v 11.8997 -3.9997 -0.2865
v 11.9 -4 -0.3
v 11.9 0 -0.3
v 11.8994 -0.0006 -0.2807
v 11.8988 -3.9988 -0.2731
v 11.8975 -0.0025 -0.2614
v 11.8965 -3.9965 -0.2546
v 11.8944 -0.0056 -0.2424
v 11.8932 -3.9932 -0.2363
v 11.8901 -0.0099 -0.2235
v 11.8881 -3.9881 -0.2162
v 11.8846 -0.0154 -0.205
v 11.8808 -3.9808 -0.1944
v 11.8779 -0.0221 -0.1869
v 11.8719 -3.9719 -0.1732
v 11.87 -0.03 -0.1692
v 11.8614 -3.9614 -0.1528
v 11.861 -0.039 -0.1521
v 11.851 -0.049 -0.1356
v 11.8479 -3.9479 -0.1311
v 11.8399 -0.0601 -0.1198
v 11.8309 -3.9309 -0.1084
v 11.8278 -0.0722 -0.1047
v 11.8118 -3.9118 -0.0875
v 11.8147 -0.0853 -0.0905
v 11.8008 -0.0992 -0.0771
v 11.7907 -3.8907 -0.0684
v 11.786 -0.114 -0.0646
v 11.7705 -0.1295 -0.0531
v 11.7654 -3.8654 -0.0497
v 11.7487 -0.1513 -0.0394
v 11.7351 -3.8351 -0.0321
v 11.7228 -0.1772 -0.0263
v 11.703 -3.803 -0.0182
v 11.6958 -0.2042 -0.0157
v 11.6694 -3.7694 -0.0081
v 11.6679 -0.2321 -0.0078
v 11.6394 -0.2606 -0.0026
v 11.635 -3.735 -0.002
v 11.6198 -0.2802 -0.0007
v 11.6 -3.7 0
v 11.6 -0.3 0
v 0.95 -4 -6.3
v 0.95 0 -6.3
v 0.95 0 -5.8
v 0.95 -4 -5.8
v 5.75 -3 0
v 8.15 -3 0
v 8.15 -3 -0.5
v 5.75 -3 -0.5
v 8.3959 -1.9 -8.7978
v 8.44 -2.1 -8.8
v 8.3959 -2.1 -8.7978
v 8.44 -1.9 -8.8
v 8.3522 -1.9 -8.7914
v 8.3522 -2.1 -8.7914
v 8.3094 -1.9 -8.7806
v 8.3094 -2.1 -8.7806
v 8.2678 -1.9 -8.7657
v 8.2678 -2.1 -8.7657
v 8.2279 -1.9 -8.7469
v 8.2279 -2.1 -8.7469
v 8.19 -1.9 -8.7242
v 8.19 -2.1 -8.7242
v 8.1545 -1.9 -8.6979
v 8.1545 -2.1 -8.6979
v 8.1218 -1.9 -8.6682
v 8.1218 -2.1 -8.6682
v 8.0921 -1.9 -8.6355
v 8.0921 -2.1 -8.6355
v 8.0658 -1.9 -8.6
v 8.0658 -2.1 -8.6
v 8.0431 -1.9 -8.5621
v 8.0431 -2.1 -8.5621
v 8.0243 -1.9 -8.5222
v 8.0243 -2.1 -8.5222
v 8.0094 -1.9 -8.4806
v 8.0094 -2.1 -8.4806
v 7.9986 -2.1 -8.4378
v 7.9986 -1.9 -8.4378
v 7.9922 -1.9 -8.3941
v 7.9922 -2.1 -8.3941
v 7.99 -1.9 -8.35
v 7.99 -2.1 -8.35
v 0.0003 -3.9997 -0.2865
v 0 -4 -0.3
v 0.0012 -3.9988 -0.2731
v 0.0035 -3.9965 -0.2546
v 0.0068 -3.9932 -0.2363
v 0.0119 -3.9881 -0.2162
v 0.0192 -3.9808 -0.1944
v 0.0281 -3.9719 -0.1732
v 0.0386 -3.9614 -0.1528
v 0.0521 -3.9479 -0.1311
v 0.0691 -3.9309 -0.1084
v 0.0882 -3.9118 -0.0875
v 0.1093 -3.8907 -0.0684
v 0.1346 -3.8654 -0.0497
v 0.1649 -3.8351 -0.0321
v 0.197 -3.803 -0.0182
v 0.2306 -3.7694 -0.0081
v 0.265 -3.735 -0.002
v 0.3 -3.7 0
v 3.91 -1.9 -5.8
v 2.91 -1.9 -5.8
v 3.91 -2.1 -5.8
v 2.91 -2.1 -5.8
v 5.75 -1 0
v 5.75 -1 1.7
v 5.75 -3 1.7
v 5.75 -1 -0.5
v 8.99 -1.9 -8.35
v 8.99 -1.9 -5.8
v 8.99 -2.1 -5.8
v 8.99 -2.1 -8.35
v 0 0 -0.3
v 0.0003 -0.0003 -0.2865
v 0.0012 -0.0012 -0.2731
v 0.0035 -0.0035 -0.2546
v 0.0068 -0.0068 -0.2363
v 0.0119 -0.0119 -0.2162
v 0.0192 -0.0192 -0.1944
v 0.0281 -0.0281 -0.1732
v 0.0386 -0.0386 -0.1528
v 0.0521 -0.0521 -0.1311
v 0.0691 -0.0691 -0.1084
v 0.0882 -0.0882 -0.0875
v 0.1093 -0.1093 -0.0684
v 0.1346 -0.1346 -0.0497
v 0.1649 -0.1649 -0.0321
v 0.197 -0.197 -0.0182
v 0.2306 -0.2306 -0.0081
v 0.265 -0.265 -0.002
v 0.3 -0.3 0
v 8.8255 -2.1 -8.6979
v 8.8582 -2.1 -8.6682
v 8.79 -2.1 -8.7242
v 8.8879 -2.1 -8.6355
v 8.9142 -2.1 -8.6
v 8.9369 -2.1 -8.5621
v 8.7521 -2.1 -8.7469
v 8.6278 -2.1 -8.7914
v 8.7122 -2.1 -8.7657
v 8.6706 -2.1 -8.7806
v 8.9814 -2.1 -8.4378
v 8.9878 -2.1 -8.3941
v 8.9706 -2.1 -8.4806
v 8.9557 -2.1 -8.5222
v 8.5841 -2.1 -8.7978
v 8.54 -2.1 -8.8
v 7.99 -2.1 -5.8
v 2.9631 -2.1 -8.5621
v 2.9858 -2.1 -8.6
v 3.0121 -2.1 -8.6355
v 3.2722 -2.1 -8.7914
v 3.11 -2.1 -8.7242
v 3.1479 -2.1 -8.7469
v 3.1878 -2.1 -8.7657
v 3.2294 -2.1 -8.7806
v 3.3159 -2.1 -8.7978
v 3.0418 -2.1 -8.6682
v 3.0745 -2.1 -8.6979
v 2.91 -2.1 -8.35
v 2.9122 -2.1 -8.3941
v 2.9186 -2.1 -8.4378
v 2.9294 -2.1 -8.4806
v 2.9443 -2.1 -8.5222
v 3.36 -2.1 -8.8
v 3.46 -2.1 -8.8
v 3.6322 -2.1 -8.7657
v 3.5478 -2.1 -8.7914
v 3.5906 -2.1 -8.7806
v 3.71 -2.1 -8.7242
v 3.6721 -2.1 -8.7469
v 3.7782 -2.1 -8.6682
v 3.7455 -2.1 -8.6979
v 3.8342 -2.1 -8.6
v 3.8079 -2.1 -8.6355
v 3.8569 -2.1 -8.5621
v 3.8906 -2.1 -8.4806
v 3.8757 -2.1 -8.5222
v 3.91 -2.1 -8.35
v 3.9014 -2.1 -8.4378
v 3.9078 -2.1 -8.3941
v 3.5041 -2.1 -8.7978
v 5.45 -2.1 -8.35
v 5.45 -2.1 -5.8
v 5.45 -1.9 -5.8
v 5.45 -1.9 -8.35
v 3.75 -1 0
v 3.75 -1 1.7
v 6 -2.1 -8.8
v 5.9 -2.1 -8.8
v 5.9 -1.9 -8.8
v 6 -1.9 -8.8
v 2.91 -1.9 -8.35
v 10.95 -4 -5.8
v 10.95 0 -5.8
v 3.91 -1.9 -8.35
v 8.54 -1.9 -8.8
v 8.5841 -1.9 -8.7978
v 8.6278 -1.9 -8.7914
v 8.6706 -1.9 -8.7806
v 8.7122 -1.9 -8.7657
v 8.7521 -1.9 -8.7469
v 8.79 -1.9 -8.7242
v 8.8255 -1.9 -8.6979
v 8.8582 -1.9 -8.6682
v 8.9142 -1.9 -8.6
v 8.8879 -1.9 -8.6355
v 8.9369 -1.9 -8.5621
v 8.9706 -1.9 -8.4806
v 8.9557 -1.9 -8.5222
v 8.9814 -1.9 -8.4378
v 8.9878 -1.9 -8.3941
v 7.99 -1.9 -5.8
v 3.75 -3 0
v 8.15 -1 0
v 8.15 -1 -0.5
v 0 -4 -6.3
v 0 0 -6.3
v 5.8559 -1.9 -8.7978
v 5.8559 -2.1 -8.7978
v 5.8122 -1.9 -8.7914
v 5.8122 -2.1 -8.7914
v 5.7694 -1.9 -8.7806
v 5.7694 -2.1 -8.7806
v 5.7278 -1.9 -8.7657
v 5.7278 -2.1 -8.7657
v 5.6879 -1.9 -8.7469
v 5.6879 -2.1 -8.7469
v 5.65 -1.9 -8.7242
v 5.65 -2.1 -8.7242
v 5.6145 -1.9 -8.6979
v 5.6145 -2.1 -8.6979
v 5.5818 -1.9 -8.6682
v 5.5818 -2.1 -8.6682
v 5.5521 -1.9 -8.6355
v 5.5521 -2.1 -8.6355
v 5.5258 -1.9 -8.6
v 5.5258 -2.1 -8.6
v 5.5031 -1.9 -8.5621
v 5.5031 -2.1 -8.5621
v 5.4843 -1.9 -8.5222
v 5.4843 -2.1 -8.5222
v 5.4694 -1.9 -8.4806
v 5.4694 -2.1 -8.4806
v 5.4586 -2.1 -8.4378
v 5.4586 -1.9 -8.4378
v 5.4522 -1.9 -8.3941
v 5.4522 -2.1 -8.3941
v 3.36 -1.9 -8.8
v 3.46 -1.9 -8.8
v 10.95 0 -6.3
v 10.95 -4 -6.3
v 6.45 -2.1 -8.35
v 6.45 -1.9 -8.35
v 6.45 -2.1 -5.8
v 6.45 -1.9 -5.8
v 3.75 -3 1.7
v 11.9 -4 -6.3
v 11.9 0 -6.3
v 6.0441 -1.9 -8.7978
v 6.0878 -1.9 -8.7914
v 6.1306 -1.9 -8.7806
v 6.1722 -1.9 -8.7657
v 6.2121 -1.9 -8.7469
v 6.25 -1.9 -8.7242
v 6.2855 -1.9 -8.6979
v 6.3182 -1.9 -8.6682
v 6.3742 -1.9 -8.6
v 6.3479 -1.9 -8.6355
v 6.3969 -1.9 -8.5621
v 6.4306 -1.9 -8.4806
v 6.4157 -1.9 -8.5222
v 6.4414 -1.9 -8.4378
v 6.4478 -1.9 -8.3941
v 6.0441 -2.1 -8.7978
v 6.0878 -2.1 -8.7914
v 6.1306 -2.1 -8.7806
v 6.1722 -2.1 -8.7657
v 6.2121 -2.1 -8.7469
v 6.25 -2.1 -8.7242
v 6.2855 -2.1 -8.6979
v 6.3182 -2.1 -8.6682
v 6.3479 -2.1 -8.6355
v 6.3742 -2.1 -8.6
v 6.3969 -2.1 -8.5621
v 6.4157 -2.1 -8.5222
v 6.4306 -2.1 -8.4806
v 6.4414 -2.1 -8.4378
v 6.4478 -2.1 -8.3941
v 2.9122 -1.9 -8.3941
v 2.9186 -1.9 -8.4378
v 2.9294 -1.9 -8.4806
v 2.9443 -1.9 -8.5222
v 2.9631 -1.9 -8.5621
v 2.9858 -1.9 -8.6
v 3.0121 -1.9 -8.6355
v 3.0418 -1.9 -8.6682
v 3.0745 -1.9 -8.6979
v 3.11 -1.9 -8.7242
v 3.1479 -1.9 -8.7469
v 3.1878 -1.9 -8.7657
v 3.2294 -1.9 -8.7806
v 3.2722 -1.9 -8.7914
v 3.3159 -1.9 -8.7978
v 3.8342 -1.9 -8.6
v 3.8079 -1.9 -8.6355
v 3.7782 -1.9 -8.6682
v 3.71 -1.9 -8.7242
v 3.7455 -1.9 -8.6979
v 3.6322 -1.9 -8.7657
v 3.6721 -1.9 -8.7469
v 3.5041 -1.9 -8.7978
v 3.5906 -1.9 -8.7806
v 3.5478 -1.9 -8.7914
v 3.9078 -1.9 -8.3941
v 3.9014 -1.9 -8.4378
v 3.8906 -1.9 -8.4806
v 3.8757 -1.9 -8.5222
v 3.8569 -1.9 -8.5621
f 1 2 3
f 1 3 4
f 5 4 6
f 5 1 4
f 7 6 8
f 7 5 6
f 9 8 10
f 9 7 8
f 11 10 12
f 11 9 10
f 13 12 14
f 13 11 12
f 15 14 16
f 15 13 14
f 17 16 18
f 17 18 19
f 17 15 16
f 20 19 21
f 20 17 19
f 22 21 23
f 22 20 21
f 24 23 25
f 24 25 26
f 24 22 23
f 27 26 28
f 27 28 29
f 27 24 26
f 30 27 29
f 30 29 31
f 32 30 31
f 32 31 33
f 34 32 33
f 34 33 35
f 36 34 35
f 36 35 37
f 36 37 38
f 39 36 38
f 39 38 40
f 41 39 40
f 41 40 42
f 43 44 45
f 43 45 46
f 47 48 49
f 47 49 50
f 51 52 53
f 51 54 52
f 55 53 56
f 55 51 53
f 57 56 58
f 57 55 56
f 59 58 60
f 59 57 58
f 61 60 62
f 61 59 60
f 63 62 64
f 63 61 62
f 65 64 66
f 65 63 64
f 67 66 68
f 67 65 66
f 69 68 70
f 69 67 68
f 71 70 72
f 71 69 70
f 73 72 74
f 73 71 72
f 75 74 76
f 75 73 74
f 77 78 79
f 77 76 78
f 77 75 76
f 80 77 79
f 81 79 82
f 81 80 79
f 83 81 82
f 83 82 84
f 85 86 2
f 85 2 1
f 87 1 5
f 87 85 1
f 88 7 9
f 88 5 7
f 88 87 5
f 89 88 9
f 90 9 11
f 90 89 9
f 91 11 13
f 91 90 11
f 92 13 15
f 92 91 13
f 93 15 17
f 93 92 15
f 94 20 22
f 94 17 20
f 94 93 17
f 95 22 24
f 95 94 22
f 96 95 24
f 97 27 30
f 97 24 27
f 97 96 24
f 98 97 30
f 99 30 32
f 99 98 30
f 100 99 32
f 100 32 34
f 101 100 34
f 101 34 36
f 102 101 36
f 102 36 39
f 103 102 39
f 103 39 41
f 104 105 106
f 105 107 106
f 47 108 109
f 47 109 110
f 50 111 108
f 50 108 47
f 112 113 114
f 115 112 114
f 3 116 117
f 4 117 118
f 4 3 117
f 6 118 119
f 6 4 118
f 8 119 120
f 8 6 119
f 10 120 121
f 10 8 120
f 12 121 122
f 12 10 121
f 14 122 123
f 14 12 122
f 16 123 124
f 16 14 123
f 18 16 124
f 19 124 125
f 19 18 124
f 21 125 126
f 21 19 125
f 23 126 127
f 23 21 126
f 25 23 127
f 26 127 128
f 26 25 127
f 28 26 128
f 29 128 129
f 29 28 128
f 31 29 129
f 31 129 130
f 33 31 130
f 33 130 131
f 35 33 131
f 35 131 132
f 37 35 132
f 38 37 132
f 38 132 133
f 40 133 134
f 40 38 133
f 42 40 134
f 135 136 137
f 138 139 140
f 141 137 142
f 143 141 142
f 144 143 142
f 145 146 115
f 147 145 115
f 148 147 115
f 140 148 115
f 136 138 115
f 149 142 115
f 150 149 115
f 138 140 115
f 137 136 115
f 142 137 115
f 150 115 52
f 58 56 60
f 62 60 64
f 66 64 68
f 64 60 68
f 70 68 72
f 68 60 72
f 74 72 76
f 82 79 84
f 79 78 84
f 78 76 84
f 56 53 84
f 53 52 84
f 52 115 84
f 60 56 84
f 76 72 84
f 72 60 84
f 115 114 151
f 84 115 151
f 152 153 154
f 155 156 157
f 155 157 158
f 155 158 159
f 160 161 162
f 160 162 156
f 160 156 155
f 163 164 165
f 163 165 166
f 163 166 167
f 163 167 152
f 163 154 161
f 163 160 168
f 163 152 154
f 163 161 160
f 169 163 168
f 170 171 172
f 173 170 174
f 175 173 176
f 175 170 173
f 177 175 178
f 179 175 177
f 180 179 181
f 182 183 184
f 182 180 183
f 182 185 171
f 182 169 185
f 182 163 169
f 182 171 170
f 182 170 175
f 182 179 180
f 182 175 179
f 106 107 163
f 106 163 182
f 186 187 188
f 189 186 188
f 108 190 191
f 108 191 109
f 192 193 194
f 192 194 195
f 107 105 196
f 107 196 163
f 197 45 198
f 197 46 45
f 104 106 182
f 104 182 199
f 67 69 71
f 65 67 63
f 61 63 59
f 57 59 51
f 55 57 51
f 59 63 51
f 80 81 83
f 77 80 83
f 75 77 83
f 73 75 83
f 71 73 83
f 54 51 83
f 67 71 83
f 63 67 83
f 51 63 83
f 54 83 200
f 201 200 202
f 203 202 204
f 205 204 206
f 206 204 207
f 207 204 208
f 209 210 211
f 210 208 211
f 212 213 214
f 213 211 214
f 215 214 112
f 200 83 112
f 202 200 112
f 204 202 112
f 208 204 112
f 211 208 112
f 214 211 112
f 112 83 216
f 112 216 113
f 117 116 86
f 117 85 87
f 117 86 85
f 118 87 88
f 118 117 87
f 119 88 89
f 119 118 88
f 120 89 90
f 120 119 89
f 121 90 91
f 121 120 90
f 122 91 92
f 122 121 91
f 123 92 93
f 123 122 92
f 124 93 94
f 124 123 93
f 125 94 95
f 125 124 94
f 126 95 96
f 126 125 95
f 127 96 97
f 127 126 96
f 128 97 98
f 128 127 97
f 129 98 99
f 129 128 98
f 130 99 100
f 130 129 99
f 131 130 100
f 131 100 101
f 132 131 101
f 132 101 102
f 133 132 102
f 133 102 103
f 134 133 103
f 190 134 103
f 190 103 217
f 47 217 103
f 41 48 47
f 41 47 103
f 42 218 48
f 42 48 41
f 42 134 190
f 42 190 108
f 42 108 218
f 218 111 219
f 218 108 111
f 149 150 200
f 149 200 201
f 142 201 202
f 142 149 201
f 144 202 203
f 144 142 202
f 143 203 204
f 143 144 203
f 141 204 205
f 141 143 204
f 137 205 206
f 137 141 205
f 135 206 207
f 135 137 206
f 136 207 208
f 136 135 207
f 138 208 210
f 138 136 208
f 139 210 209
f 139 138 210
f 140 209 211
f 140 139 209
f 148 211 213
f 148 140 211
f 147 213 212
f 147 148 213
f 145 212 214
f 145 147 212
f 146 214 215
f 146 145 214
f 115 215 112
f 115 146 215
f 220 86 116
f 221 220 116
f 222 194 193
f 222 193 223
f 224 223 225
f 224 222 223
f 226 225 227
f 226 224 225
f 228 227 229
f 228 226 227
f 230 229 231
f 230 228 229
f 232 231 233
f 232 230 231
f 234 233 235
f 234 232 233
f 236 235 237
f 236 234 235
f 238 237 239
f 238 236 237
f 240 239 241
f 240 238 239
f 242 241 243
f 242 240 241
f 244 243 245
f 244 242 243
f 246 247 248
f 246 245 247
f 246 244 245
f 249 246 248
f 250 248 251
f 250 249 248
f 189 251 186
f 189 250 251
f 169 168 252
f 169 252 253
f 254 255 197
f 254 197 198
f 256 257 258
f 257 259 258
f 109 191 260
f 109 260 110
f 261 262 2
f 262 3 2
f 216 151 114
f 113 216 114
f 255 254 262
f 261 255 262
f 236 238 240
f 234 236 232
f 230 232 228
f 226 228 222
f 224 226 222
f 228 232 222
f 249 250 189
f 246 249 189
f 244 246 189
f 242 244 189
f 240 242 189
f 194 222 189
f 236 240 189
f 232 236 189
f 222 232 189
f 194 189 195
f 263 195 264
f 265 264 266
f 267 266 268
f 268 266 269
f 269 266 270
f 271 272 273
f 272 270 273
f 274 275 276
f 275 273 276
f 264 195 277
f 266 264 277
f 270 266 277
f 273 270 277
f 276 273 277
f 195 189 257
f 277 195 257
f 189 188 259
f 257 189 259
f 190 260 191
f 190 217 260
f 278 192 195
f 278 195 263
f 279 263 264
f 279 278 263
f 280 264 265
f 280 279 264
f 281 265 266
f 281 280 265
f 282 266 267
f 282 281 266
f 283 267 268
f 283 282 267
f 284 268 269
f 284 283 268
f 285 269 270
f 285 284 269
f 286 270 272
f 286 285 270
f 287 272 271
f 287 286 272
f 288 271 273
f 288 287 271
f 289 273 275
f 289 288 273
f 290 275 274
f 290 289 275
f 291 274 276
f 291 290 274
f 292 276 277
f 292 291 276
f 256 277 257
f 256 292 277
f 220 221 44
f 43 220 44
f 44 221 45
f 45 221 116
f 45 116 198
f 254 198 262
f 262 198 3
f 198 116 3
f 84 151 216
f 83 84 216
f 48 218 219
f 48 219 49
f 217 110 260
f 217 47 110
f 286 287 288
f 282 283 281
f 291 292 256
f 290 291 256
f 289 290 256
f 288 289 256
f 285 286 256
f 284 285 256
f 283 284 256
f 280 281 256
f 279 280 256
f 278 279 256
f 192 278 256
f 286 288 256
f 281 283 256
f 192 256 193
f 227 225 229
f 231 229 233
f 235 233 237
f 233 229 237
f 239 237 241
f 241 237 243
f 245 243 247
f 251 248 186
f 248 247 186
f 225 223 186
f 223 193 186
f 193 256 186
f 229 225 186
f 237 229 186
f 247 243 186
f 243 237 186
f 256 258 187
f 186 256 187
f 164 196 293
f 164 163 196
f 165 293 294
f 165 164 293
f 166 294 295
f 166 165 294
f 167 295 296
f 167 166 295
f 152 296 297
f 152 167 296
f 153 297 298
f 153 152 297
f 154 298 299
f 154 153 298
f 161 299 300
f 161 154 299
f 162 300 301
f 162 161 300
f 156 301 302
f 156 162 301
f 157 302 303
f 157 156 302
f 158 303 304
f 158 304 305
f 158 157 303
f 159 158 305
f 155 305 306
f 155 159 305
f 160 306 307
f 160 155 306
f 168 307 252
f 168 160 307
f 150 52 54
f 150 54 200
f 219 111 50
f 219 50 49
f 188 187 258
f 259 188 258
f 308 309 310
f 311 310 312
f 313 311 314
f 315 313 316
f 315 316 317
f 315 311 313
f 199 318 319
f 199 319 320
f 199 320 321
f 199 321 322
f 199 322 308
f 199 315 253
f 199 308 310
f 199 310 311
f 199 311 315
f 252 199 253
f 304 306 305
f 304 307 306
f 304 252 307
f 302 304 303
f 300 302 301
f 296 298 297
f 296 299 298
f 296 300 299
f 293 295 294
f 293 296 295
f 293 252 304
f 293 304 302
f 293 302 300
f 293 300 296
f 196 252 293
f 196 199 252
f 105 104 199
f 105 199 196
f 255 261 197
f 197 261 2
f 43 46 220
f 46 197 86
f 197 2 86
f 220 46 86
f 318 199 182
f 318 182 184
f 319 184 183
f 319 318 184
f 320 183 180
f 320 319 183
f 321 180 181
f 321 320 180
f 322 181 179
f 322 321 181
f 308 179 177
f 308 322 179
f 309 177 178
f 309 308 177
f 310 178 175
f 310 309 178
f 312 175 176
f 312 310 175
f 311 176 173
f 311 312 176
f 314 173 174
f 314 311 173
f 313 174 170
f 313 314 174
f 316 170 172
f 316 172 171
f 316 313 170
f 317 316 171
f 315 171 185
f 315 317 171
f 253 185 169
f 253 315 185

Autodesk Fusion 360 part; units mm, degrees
sketch "Slider" plane through (0, 0, 0) normal (0, 0, 1) x (1, 0, 0)
  line L0 (0, 0) -> (11.9, 0)
  line L1 (11.9, 0) -> (11.9, -4)
  line L2 (11.9, -4) -> (0, -4)
  line L3 (0, -4) -> (0, 0)
  line L4 (5.95, 0) -> (5.95, -4) construction
  line L5 (0, -2) -> (11.9, -2) construction
  line L6 (8.15, -3) -> (3.75, -3)
  line L7 (3.75, -3) -> (3.75, -1)
  line L8 (3.75, -1) -> (8.15, -1)
  line L9 (8.15, -1) -> (8.15, -3)
  line L10 (8.15, -3) -> (3.75, -1) construction
  line L11 (3.75, -3) -> (8.15, -1) construction
  line L12 (3.75, -1) -> (5.75, -1)
  line L13 (5.75, -1) -> (5.75, -3)
  line L14 (5.75, -3) -> (3.75, -3)
  line L15 (3.75, -3) -> (3.75, -1)
  point P0 (5.95, -2)
  dimension "d1" = 11.9
  dimension "d2" = 4
  dimension "d3" = 4.4
  dimension "d4" = 2
  dimension "d5" = 2
extrude "Extrude1" add sketch "Slider" against normal blind 6.3 contours L0 L1 L2 L3 | L6 L8 L9 L13 | L6 L7 L8 L12 L13 L14 L15 makes body 1
extrude "Extrude2" cut sketch "Slider" against normal blind 0.5 contours L6 L8 L9 L13 | L6 L7 L8 L12 L13 L14 L15 bodies 1
extrude "Extrude3" add sketch "Slider" along normal blind 1.7 and the other way blind 0.5 contours L6 L7 L8 L12 L13 L14 L15 bodies 1
sketch "Base" plane through (0, 0, -6.3) normal (0, 0, -1) x (1, 0, 0)
  line L0 (11.9, 4) -> (0, 4)
  line L1 (0, 4) -> (0, 0)
  line L2 (0, 0) -> (11.9, 0)
  line L3 (11.9, 0) -> (11.9, 4)
  line L4 (5.95, 4) -> (5.95, 0) construction
  line L5 (0, 2) -> (11.9, 2) construction
  line L6 (10.95, 0) -> (0.95, 0)
  line L7 (0.95, 0) -> (0.95, 4)
  line L8 (0.95, 4) -> (10.95, 4)
  line L9 (10.95, 4) -> (10.95, 0)
  line L10 (10.95, 0) -> (0.95, 4) construction
  line L11 (0.95, 0) -> (10.95, 4) construction
  point P0 (5.95, 2)
  dimension "d13" = 10
  dimension "d14" = 4
extrude "Extrude4" cut sketch "Base" against normal blind 0.5 contours L0 L2 L6 L7 L8 L9 bodies 1
sketch "Pins" plane through (0, 0, -5.8) normal (0, 0, -1) x (1, 0, 0)
  line L0 (10.95, 4) -> (0.95, 4)
  line L1 (0.95, 4) -> (0.95, 0)
  line L2 (0.95, 0) -> (10.95, 0)
  line L3 (10.95, 0) -> (10.95, 4)
  line L4 (5.95, 4) -> (5.95, 0) construction
  line L5 (10.95, 2) -> (0.95, 2) construction
  line L6 (6.45, 2.1) -> (5.45, 2.1)
  line L7 (5.45, 2.1) -> (5.45, 1.9)
  line L8 (5.45, 1.9) -> (6.45, 1.9)
  line L9 (6.45, 1.9) -> (6.45, 2.1)
  line L10 (6.45, 2.1) -> (5.45, 1.9) construction
  line L11 (5.45, 2.1) -> (6.45, 1.9) construction
  line L12 (8.99, 2.1) -> (7.99, 2.1)
  line L13 (7.99, 2.1) -> (7.99, 1.9)
  line L14 (7.99, 1.9) -> (8.99, 1.9)
  line L15 (8.99, 1.9) -> (8.99, 2.1)
  line L16 (8.99, 2.1) -> (7.99, 1.9) construction
  line L17 (7.99, 2.1) -> (8.99, 1.9) construction
  line L18 (3.91, 1.9) -> (2.91, 1.9)
  line L19 (2.91, 2.1) -> (3.91, 2.1)
  line L20 (2.91, 1.9) -> (2.91, 2.1)
  line L21 (3.91, 2.1) -> (3.91, 1.9)
  point P0 (5.95, 2)
  point P1 (8.49, 2)
  dimension "d18" = 1
  dimension "d19" = 0.2
  dimension "d20" = 0.2
  dimension "d21" = 1
  dimension "d22" = 2.54
extrude "Extrude5" add sketch "Pins" along normal blind 3 separate body contours L6 L7 L8 L9 | L12 L13 L14 L15 | L18 L19 L20 L21 makes body 2 at (3.2433, -1.9, -7.8) makes body 3 at (5.7833, -1.9, -6.8) makes body 4 at (8.3233, -1.9, -6.8)
fillet "Fillet1" radius 0.45 6 edges at (8.99, -2, -8.8) (7.99, -2, -8.8) (6.45, -2, -8.8) (5.45, -2, -8.8) (3.91, -2, -8.8) (2.91, -2, -8.8) on bodies 2 3 4
fillet "Fillet2" radius 0.3 4 edges at (0, -2, 0) (5.95, -4, 0) (5.95, 0, 0) (11.9, -2, 0) on bodies 1
sketch "Connections" plane through (0, 0, -5.8) normal (0, 0, -1) x (1, 0, 0)
  line L0 (10.95, 4) -> (0.95, 4)
  line L1 (0.95, 4) -> (0.95, 0)
  line L2 (0.95, 0) -> (10.95, 0)
  line L3 (10.95, 0) -> (10.95, 4)
  circle A0 centre (5.95, 2) radius 0.635
  line L4 (5.95, 4) -> (5.95, 0)
  circle A1 centre (8.49, 2) radius 0.635
  circle A2 centre (3.41, 2) radius 0.635
  point P0 (8.49, 2)
  point P1 (5.95, 2)
  dimension "d28" = 1.27
  dimension "d29" = 1.27
equation "d20 = d19"
equation "d21 = d18"
equation "WireDia = 1.27 mm"
equation "d28 = WireDia"
equation "d29 = WireDia"
